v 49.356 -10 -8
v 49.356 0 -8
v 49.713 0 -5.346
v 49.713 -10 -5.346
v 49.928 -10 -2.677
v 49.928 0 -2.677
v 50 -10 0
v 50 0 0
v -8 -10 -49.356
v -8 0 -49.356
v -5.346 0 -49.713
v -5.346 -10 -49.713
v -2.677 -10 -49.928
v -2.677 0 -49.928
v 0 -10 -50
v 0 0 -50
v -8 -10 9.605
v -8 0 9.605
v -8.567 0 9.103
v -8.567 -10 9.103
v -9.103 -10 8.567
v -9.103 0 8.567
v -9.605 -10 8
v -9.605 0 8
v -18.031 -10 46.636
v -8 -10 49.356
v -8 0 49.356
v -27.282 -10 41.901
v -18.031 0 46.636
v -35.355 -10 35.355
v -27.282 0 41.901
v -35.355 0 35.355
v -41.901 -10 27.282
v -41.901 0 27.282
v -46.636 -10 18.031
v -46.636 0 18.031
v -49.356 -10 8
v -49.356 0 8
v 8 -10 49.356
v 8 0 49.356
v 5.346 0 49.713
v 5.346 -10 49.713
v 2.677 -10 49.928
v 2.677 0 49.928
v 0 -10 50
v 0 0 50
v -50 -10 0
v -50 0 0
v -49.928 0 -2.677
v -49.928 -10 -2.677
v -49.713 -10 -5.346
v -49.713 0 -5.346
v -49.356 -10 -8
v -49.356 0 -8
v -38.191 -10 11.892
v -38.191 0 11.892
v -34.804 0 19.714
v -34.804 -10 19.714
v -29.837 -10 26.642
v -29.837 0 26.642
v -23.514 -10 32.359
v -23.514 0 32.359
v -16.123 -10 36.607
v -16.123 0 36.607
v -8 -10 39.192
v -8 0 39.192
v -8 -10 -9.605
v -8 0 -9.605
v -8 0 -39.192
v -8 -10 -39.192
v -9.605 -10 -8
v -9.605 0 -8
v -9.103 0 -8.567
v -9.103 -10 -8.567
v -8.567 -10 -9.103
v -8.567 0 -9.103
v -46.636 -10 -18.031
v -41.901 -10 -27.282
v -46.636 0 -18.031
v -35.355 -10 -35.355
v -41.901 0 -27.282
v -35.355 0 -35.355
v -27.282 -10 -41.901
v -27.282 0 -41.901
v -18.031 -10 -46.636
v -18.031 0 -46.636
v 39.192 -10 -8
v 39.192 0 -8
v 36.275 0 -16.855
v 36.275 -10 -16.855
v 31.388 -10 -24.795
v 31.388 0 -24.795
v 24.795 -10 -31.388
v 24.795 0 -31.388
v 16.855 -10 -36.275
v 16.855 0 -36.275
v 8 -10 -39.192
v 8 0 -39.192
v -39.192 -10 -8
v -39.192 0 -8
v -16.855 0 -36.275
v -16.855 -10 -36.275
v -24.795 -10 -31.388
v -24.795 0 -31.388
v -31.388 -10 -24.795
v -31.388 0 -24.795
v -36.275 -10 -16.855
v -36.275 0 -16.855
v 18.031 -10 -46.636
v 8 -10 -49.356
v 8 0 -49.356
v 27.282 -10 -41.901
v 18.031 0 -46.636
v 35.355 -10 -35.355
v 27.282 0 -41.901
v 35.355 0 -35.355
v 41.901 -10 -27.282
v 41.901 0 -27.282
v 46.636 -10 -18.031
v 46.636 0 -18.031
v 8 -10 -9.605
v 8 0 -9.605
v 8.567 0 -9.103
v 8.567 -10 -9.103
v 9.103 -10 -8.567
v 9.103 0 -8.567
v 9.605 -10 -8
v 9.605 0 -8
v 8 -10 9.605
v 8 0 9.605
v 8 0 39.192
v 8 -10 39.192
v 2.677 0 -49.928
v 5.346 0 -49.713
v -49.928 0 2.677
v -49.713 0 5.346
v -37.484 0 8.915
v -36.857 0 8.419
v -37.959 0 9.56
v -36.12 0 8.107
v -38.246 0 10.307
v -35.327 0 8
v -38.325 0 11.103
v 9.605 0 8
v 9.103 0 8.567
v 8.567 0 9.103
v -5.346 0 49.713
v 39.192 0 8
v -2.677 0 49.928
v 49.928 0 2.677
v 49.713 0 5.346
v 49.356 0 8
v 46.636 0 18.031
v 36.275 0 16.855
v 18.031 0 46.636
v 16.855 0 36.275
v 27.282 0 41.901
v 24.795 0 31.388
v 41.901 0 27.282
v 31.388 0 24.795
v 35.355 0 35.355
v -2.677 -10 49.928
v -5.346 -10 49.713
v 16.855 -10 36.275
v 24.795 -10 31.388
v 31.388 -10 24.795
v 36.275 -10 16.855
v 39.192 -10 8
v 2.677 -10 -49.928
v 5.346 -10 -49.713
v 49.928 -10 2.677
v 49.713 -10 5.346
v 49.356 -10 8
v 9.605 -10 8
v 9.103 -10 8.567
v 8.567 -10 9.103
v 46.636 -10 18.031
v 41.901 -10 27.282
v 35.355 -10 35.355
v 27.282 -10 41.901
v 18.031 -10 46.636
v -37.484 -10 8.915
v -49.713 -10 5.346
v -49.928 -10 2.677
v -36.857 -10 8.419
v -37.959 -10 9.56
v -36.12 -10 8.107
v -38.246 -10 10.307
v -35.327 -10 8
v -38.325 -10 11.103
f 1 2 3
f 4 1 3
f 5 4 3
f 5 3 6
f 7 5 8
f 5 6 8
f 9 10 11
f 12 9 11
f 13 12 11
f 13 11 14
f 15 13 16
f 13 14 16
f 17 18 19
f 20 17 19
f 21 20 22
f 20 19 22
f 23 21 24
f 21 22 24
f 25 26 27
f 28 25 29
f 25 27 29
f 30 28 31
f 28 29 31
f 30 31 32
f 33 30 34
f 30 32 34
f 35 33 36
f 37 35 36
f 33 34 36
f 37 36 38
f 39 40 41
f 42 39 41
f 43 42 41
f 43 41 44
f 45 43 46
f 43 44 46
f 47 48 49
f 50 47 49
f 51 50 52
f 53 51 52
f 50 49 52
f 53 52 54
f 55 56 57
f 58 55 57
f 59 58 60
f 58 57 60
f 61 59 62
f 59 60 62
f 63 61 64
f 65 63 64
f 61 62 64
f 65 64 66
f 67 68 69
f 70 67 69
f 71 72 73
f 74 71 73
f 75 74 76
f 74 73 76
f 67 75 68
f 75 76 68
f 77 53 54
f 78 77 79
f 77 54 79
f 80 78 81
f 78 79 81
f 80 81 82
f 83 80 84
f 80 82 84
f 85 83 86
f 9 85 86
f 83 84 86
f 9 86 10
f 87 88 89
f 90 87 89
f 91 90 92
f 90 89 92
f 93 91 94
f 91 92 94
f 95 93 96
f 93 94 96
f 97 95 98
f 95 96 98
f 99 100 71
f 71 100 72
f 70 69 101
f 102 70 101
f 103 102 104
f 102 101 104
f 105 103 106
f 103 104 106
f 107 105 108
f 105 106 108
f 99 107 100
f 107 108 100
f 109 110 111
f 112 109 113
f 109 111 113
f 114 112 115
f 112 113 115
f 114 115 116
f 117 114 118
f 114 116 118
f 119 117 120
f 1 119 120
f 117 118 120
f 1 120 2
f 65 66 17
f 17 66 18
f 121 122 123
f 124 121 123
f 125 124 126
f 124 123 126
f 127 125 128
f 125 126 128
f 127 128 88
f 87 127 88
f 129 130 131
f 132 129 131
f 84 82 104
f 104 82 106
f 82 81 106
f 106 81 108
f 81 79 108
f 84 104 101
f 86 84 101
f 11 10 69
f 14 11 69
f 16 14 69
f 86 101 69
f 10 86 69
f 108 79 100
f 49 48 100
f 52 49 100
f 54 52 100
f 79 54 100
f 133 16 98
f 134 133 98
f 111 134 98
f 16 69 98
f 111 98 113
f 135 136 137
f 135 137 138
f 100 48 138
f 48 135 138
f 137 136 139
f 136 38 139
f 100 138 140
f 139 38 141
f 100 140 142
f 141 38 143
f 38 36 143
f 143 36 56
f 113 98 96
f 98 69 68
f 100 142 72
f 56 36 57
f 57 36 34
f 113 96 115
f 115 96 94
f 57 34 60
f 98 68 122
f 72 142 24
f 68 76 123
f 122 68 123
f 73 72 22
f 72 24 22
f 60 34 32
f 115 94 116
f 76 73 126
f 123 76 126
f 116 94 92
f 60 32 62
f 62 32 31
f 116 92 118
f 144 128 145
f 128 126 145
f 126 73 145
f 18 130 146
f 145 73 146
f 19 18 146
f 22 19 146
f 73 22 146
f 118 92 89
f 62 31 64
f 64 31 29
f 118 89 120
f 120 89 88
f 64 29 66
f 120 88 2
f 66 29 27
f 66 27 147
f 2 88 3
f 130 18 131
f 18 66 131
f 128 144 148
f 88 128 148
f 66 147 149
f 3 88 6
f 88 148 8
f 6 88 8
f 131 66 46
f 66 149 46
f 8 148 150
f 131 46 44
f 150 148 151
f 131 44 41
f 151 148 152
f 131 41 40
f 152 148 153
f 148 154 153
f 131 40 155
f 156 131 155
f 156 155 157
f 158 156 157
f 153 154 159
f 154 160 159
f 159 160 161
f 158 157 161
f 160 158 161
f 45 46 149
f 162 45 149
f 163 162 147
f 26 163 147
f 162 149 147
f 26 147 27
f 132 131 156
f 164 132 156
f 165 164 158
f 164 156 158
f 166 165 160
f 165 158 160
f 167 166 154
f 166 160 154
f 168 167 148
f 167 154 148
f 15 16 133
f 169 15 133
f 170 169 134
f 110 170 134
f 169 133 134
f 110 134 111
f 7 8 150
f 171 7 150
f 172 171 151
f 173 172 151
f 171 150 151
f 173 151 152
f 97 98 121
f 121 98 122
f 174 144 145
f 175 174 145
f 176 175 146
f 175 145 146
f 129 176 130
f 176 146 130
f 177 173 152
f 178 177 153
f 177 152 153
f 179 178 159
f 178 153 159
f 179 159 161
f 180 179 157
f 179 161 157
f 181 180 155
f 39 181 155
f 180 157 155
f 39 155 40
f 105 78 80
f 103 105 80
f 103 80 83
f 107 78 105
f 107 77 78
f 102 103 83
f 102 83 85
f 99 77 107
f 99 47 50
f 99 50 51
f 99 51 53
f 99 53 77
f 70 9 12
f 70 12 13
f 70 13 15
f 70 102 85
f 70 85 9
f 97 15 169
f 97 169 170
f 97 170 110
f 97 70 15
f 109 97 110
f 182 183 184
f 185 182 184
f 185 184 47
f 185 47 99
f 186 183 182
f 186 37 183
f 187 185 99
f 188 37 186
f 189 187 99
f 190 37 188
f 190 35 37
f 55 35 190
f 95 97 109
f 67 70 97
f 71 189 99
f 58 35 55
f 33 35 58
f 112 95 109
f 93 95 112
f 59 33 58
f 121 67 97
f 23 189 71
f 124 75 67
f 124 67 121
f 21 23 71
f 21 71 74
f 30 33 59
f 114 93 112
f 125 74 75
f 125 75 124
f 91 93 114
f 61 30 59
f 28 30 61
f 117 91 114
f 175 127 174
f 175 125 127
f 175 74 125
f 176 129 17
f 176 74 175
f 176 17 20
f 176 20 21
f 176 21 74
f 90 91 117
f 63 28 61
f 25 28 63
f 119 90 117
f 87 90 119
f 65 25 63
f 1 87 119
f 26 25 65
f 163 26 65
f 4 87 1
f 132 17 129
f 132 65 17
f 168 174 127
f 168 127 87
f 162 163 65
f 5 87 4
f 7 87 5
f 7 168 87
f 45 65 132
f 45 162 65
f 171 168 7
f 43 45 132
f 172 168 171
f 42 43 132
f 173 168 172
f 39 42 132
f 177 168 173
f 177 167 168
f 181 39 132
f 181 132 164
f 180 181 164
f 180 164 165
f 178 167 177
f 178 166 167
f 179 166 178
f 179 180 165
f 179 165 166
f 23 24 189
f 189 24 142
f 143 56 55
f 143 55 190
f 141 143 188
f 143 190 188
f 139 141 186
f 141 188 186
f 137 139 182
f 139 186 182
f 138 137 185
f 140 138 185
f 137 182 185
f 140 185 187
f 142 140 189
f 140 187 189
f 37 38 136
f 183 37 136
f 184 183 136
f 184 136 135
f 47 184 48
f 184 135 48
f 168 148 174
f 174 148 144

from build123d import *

# Parameters (mm, degrees)
F1_DEPTH = 10
F3_DEPTH = 10
F4_R     = 5.005299482
F5_DEPTH = 10
F6_R     = 3


with BuildPart() as f1:
    # F0 (on Front) → F1 (new body)
    with BuildSketch(Plane.XZ):
        with BuildLine():
            Line((-8, 39.1918358845), (-8, 49.355850717))
            ThreePointArc((-8, 49.355850717), (-35.3553390593, 35.3553390593), (-49.355850717, 8))
            Line((-49.355850717, 8), (-39.1918358845, 8))
            ThreePointArc((-39.1918358845, 8), (-28.2842712475, 28.2842712475), (-8, 39.1918358845))
        make_face()
        with BuildLine():
            Line((8, -8), (8, 0))
            Line((8, 0), (5, 0))
            ThreePointArc((5, 0), (3.5355339059, -3.5355339059), (0, -5))
            Line((0, -5), (0, -8))
            Line((0, -8), (8, -8))
        make_face()
        with BuildLine():
            ThreePointArc((8, -9.6046863561), (8.8388347648, -8.8388347648), (9.6046863561, -8))
            Line((9.6046863561, -8), (8, -8))
            Line((8, -8), (8, -9.6046863561))
        make_face()
        with BuildLine():
            ThreePointArc((9.6046863561, -8), (11.7539052968, -4.2539052968), (12.5, 0))
            Line((12.5, 0), (8, 0))
            Line((8, 0), (8, -8))
            Line((8, -8), (9.6046863561, -8))
        make_face()
        with BuildLine():
            ThreePointArc((-8, -9.6046863561), (-4.2539052968, -11.7539052968), (0, -12.5))
            Line((0, -12.5), (0, -8))
            Line((0, -8), (-8, -8))
            Line((-8, -8), (-8, -9.6046863561))
        make_face()
        with BuildLine():
            Line((5, 0), (8, 0))
            Line((8, 0), (8, 8))
            Line((8, 8), (0, 8))
            Line((0, 8), (0, 5))
            ThreePointArc((0, 5), (3.5355339059, 3.5355339059), (5, 0))
        make_face()
        with BuildLine():
            Line((8, 0), (12.5, 0))
            ThreePointArc((12.5, 0), (11.7539052968, 4.2539052968), (9.6046863561, 8))
            Line((9.6046863561, 8), (8, 8))
            Line((8, 8), (8, 0))
        make_face()
        with BuildLine():
            Line((12.5, 0), (40, 0))
            ThreePointArc((40, 0), (39.7974461202, 4.0203584802), (39.1918358845, 8))
            Line((39.1918358845, 8), (9.6046863561, 8))
            ThreePointArc((9.6046863561, 8), (11.7539052968, 4.2539052968), (12.5, 0))
        make_face()
        with BuildLine():
            ThreePointArc((0, -12.5), (4.2539052968, -11.7539052968), (8, -9.6046863561))
            Line((8, -9.6046863561), (8, -8))
            Line((8, -8), (0, -8))
            Line((0, -8), (0, -12.5))
        make_face()
        with BuildLine():
            ThreePointArc((-9.6046863561, -8), (-8.8388347648, -8.8388347648), (-8, -9.6046863561))
            Line((-8, -9.6046863561), (-8, -8))
            Line((-8, -8), (-9.6046863561, -8))
        make_face()
        with BuildLine():
            Line((-8, -8), (0, -8))
            Line((0, -8), (0, -5))
            ThreePointArc((0, -5), (-3.5355339059, -3.5355339059), (-5, 0))
            Line((-5, 0), (-8, 0))
            Line((-8, 0), (-8, -8))
        make_face()
        with BuildLine():
            Line((-9.6046863561, -8), (-8, -8))
            Line((-8, -8), (-8, 0))
            Line((-8, 0), (-12.5, 0))
            ThreePointArc((-12.5, 0), (-11.7539052968, -4.2539052968), (-9.6046863561, -8))
        make_face()
        with BuildLine():
            Line((0, 5), (0, 8))
            Line((0, 8), (-8, 8))
            Line((-8, 8), (-8, 0))
            Line((-8, 0), (-5, 0))
            ThreePointArc((-5, 0), (-3.5355339059, 3.5355339059), (0, 5))
        make_face()
        with BuildLine():
            Line((-8, 0), (-8, 8))
            Line((-8, 8), (-9.6046863561, 8))
            ThreePointArc((-9.6046863561, 8), (-11.7539052968, 4.2539052968), (-12.5, 0))
            Line((-12.5, 0), (-8, 0))
        make_face()
        with BuildLine():
            Line((-8, 8), (-8, 9.6046863561))
            ThreePointArc((-8, 9.6046863561), (-8.8388347648, 8.8388347648), (-9.6046863561, 8))
            Line((-9.6046863561, 8), (-8, 8))
        make_face()
        with BuildLine():
            Line((0, 8), (0, 12.5))
            ThreePointArc((0, 12.5), (-4.2539052968, 11.7539052968), (-8, 9.6046863561))
            Line((-8, 9.6046863561), (-8, 8))
            Line((-8, 8), (0, 8))
        make_face()
        with BuildLine():
            Line((8, 8), (8, 9.6046863561))
            ThreePointArc((8, 9.6046863561), (4.2539052968, 11.7539052968), (0, 12.5))
            Line((0, 12.5), (0, 8))
            Line((0, 8), (8, 8))
        make_face()
        with BuildLine():
            Line((8, 8), (9.6046863561, 8))
            ThreePointArc((9.6046863561, 8), (8.8388347648, 8.8388347648), (8, 9.6046863561))
            Line((8, 9.6046863561), (8, 8))
        make_face()
        with BuildLine():
            ThreePointArc((39.1918358845, -8), (39.7974461202, -4.0203584802), (40, 0))
            Line((40, 0), (12.5, 0))
            ThreePointArc((12.5, 0), (11.7539052968, -4.2539052968), (9.6046863561, -8))
            Line((9.6046863561, -8), (39.1918358845, -8))
        make_face()
        with BuildLine():
            Line((-9.6046863561, 8), (-39.1918358845, 8))
            ThreePointArc((-39.1918358845, 8), (-39.7974461202, 4.0203584802), (-40, 0))
            Line((-40, 0), (-12.5, 0))
            ThreePointArc((-12.5, 0), (-11.7539052968, 4.2539052968), (-9.6046863561, 8))
        make_face()
        with BuildLine():
            ThreePointArc((-40, 0), (-39.7974461202, -4.0203584802), (-39.1918358845, -8))
            Line((-39.1918358845, -8), (-9.6046863561, -8))
            ThreePointArc((-9.6046863561, -8), (-11.7539052968, -4.2539052968), (-12.5, 0))
            Line((-12.5, 0), (-40, 0))
        make_face()
        with BuildLine():
            Line((0, 12.5), (0, 40))
            ThreePointArc((0, 40), (-4.0203584802, 39.7974461202), (-8, 39.1918358845))
            Line((-8, 39.1918358845), (-8, 9.6046863561))
            ThreePointArc((-8, 9.6046863561), (-4.2539052968, 11.7539052968), (0, 12.5))
        make_face()
        with BuildLine():
            Line((8, 9.6046863561), (8, 39.1918358845))
            ThreePointArc((8, 39.1918358845), (4.0203584802, 39.7974461202), (0, 40))
            Line((0, 40), (0, 12.5))
            ThreePointArc((0, 12.5), (4.2539052968, 11.7539052968), (8, 9.6046863561))
        make_face()
        with BuildLine():
            ThreePointArc((-8, -39.1918358845), (-4.0203584802, -39.7974461202), (0, -40))
            Line((0, -40), (0, -12.5))
            ThreePointArc((0, -12.5), (-4.2539052968, -11.7539052968), (-8, -9.6046863561))
            Line((-8, -9.6046863561), (-8, -39.1918358845))
        make_face()
        with BuildLine():
            ThreePointArc((0, -40), (4.0203584802, -39.7974461202), (8, -39.1918358845))
            Line((8, -39.1918358845), (8, -9.6046863561))
            ThreePointArc((8, -9.6046863561), (4.2539052968, -11.7539052968), (0, -12.5))
            Line((0, -12.5), (0, -40))
        make_face()
        with BuildLine():
            ThreePointArc((-49.355850717, -8), (-35.3553390593, -35.3553390593), (-8, -49.355850717))
            Line((-8, -49.355850717), (-8, -39.1918358845))
            ThreePointArc((-8, -39.1918358845), (-28.2842712475, -28.2842712475), (-39.1918358845, -8))
            Line((-39.1918358845, -8), (-49.355850717, -8))
        make_face()
        with BuildLine():
            Line((-39.1918358845, 8), (-49.355850717, 8))
            ThreePointArc((-49.355850717, 8), (-49.8387025105, 4.0129455609), (-50, 0))
            Line((-50, 0), (-40, 0))
            ThreePointArc((-40, 0), (-39.7974461202, 4.0203584802), (-39.1918358845, 8))
        make_face()
        with BuildLine():
            ThreePointArc((-50, 0), (-49.8387025105, -4.0129455609), (-49.355850717, -8))
            Line((-49.355850717, -8), (-39.1918358845, -8))
            ThreePointArc((-39.1918358845, -8), (-39.7974461202, -4.0203584802), (-40, 0))
            Line((-40, 0), (-50, 0))
        make_face()
        with BuildLine():
            Line((0, 40), (0, 50))
            ThreePointArc((0, 50), (-4.0129455609, 49.8387025105), (-8, 49.355850717))
            Line((-8, 49.355850717), (-8, 39.1918358845))
            ThreePointArc((-8, 39.1918358845), (-4.0203584802, 39.7974461202), (0, 40))
        make_face()
        with BuildLine():
            Line((8, 39.1918358845), (8, 49.355850717))
            ThreePointArc((8, 49.355850717), (4.0129455609, 49.8387025105), (0, 50))
            Line((0, 50), (0, 40))
            ThreePointArc((0, 40), (4.0203584802, 39.7974461202), (8, 39.1918358845))
        make_face()
        with BuildLine():
            Line((39.1918358845, 8), (49.355850717, 8))
            ThreePointArc((49.355850717, 8), (35.3553390593, 35.3553390593), (8, 49.355850717))
            Line((8, 49.355850717), (8, 39.1918358845))
            ThreePointArc((8, 39.1918358845), (28.2842712475, 28.2842712475), (39.1918358845, 8))
        make_face()
        with BuildLine():
            Line((40, 0), (50, 0))
            ThreePointArc((50, 0), (49.8387025105, 4.0129455609), (49.355850717, 8))
            Line((49.355850717, 8), (39.1918358845, 8))
            ThreePointArc((39.1918358845, 8), (39.7974461202, 4.0203584802), (40, 0))
        make_face()
        with BuildLine():
            ThreePointArc((49.355850717, -8), (49.8387025105, -4.0129455609), (50, 0))
            Line((50, 0), (40, 0))
            ThreePointArc((40, 0), (39.7974461202, -4.0203584802), (39.1918358845, -8))
            Line((39.1918358845, -8), (49.355850717, -8))
        make_face()
        with BuildLine():
            ThreePointArc((8, -49.355850717), (35.3553390593, -35.3553390593), (49.355850717, -8))
            Line((49.355850717, -8), (39.1918358845, -8))
            ThreePointArc((39.1918358845, -8), (28.2842712475, -28.2842712475), (8, -39.1918358845))
            Line((8, -39.1918358845), (8, -49.355850717))
        make_face()
        with BuildLine():
            ThreePointArc((-8, -49.355850717), (-4.0129455609, -49.8387025105), (0, -50))
            Line((0, -50), (0, -40))
            ThreePointArc((0, -40), (-4.0203584802, -39.7974461202), (-8, -39.1918358845))
            Line((-8, -39.1918358845), (-8, -49.355850717))
        make_face()
        with BuildLine():
            ThreePointArc((0, -50), (4.0129455609, -49.8387025105), (8, -49.355850717))
            Line((8, -49.355850717), (8, -39.1918358845))
            ThreePointArc((8, -39.1918358845), (4.0203584802, -39.7974461202), (0, -40))
            Line((0, -40), (0, -50))
        make_face()
    extrude(amount=F1_DEPTH)

    # F2 (on face) → F3 (join)
    with BuildSketch(Plane.XZ.offset(10)):
        with BuildLine():
            Line((7.6082753949, 1.9267198172), (4.613865055, 1.9267198172))
            ThreePointArc((4.613865055, 1.9267198172), (4.9025159498, 0.9825158332), (5, 0))
            ThreePointArc((5, 0), (4.9024071863, -0.9830583809), (4.6134384879, -1.9277409883))
            Line((4.6134384879, -1.9277409883), (7.6082753949, -1.9277409883))
            Line((7.6082753949, -1.9277409883), (7.6082753949, 0))
            Line((7.6082753949, 0), (7.6082753949, 1.9267198172))
        make_face()
        with BuildLine():
            ThreePointArc((5, 0), (4.9025159498, 0.9825158332), (4.613865055, 1.9267198172))
            ThreePointArc((4.613865055, 1.9267198172), (-4.9999999694, 0.0005533421), (4.6134384879, -1.9277409883))
            ThreePointArc((4.6134384879, -1.9277409883), (4.9024071863, -0.9830583809), (5, 0))
        make_face()
    extrude(amount=-F3_DEPTH)

    # F4 (on face) → F5 (join)
    with BuildSketch(Plane.XZ.offset(10)):
        Circle(F4_R)
    extrude(amount=-F5_DEPTH)

    # F6
    f6_edges = [f1.edges().sort_by_distance(p)[0] for p in [
        (-39.191836, -5, 8),
    ]]
    fillet(f6_edges, radius=F6_R)


solid = f1.part
